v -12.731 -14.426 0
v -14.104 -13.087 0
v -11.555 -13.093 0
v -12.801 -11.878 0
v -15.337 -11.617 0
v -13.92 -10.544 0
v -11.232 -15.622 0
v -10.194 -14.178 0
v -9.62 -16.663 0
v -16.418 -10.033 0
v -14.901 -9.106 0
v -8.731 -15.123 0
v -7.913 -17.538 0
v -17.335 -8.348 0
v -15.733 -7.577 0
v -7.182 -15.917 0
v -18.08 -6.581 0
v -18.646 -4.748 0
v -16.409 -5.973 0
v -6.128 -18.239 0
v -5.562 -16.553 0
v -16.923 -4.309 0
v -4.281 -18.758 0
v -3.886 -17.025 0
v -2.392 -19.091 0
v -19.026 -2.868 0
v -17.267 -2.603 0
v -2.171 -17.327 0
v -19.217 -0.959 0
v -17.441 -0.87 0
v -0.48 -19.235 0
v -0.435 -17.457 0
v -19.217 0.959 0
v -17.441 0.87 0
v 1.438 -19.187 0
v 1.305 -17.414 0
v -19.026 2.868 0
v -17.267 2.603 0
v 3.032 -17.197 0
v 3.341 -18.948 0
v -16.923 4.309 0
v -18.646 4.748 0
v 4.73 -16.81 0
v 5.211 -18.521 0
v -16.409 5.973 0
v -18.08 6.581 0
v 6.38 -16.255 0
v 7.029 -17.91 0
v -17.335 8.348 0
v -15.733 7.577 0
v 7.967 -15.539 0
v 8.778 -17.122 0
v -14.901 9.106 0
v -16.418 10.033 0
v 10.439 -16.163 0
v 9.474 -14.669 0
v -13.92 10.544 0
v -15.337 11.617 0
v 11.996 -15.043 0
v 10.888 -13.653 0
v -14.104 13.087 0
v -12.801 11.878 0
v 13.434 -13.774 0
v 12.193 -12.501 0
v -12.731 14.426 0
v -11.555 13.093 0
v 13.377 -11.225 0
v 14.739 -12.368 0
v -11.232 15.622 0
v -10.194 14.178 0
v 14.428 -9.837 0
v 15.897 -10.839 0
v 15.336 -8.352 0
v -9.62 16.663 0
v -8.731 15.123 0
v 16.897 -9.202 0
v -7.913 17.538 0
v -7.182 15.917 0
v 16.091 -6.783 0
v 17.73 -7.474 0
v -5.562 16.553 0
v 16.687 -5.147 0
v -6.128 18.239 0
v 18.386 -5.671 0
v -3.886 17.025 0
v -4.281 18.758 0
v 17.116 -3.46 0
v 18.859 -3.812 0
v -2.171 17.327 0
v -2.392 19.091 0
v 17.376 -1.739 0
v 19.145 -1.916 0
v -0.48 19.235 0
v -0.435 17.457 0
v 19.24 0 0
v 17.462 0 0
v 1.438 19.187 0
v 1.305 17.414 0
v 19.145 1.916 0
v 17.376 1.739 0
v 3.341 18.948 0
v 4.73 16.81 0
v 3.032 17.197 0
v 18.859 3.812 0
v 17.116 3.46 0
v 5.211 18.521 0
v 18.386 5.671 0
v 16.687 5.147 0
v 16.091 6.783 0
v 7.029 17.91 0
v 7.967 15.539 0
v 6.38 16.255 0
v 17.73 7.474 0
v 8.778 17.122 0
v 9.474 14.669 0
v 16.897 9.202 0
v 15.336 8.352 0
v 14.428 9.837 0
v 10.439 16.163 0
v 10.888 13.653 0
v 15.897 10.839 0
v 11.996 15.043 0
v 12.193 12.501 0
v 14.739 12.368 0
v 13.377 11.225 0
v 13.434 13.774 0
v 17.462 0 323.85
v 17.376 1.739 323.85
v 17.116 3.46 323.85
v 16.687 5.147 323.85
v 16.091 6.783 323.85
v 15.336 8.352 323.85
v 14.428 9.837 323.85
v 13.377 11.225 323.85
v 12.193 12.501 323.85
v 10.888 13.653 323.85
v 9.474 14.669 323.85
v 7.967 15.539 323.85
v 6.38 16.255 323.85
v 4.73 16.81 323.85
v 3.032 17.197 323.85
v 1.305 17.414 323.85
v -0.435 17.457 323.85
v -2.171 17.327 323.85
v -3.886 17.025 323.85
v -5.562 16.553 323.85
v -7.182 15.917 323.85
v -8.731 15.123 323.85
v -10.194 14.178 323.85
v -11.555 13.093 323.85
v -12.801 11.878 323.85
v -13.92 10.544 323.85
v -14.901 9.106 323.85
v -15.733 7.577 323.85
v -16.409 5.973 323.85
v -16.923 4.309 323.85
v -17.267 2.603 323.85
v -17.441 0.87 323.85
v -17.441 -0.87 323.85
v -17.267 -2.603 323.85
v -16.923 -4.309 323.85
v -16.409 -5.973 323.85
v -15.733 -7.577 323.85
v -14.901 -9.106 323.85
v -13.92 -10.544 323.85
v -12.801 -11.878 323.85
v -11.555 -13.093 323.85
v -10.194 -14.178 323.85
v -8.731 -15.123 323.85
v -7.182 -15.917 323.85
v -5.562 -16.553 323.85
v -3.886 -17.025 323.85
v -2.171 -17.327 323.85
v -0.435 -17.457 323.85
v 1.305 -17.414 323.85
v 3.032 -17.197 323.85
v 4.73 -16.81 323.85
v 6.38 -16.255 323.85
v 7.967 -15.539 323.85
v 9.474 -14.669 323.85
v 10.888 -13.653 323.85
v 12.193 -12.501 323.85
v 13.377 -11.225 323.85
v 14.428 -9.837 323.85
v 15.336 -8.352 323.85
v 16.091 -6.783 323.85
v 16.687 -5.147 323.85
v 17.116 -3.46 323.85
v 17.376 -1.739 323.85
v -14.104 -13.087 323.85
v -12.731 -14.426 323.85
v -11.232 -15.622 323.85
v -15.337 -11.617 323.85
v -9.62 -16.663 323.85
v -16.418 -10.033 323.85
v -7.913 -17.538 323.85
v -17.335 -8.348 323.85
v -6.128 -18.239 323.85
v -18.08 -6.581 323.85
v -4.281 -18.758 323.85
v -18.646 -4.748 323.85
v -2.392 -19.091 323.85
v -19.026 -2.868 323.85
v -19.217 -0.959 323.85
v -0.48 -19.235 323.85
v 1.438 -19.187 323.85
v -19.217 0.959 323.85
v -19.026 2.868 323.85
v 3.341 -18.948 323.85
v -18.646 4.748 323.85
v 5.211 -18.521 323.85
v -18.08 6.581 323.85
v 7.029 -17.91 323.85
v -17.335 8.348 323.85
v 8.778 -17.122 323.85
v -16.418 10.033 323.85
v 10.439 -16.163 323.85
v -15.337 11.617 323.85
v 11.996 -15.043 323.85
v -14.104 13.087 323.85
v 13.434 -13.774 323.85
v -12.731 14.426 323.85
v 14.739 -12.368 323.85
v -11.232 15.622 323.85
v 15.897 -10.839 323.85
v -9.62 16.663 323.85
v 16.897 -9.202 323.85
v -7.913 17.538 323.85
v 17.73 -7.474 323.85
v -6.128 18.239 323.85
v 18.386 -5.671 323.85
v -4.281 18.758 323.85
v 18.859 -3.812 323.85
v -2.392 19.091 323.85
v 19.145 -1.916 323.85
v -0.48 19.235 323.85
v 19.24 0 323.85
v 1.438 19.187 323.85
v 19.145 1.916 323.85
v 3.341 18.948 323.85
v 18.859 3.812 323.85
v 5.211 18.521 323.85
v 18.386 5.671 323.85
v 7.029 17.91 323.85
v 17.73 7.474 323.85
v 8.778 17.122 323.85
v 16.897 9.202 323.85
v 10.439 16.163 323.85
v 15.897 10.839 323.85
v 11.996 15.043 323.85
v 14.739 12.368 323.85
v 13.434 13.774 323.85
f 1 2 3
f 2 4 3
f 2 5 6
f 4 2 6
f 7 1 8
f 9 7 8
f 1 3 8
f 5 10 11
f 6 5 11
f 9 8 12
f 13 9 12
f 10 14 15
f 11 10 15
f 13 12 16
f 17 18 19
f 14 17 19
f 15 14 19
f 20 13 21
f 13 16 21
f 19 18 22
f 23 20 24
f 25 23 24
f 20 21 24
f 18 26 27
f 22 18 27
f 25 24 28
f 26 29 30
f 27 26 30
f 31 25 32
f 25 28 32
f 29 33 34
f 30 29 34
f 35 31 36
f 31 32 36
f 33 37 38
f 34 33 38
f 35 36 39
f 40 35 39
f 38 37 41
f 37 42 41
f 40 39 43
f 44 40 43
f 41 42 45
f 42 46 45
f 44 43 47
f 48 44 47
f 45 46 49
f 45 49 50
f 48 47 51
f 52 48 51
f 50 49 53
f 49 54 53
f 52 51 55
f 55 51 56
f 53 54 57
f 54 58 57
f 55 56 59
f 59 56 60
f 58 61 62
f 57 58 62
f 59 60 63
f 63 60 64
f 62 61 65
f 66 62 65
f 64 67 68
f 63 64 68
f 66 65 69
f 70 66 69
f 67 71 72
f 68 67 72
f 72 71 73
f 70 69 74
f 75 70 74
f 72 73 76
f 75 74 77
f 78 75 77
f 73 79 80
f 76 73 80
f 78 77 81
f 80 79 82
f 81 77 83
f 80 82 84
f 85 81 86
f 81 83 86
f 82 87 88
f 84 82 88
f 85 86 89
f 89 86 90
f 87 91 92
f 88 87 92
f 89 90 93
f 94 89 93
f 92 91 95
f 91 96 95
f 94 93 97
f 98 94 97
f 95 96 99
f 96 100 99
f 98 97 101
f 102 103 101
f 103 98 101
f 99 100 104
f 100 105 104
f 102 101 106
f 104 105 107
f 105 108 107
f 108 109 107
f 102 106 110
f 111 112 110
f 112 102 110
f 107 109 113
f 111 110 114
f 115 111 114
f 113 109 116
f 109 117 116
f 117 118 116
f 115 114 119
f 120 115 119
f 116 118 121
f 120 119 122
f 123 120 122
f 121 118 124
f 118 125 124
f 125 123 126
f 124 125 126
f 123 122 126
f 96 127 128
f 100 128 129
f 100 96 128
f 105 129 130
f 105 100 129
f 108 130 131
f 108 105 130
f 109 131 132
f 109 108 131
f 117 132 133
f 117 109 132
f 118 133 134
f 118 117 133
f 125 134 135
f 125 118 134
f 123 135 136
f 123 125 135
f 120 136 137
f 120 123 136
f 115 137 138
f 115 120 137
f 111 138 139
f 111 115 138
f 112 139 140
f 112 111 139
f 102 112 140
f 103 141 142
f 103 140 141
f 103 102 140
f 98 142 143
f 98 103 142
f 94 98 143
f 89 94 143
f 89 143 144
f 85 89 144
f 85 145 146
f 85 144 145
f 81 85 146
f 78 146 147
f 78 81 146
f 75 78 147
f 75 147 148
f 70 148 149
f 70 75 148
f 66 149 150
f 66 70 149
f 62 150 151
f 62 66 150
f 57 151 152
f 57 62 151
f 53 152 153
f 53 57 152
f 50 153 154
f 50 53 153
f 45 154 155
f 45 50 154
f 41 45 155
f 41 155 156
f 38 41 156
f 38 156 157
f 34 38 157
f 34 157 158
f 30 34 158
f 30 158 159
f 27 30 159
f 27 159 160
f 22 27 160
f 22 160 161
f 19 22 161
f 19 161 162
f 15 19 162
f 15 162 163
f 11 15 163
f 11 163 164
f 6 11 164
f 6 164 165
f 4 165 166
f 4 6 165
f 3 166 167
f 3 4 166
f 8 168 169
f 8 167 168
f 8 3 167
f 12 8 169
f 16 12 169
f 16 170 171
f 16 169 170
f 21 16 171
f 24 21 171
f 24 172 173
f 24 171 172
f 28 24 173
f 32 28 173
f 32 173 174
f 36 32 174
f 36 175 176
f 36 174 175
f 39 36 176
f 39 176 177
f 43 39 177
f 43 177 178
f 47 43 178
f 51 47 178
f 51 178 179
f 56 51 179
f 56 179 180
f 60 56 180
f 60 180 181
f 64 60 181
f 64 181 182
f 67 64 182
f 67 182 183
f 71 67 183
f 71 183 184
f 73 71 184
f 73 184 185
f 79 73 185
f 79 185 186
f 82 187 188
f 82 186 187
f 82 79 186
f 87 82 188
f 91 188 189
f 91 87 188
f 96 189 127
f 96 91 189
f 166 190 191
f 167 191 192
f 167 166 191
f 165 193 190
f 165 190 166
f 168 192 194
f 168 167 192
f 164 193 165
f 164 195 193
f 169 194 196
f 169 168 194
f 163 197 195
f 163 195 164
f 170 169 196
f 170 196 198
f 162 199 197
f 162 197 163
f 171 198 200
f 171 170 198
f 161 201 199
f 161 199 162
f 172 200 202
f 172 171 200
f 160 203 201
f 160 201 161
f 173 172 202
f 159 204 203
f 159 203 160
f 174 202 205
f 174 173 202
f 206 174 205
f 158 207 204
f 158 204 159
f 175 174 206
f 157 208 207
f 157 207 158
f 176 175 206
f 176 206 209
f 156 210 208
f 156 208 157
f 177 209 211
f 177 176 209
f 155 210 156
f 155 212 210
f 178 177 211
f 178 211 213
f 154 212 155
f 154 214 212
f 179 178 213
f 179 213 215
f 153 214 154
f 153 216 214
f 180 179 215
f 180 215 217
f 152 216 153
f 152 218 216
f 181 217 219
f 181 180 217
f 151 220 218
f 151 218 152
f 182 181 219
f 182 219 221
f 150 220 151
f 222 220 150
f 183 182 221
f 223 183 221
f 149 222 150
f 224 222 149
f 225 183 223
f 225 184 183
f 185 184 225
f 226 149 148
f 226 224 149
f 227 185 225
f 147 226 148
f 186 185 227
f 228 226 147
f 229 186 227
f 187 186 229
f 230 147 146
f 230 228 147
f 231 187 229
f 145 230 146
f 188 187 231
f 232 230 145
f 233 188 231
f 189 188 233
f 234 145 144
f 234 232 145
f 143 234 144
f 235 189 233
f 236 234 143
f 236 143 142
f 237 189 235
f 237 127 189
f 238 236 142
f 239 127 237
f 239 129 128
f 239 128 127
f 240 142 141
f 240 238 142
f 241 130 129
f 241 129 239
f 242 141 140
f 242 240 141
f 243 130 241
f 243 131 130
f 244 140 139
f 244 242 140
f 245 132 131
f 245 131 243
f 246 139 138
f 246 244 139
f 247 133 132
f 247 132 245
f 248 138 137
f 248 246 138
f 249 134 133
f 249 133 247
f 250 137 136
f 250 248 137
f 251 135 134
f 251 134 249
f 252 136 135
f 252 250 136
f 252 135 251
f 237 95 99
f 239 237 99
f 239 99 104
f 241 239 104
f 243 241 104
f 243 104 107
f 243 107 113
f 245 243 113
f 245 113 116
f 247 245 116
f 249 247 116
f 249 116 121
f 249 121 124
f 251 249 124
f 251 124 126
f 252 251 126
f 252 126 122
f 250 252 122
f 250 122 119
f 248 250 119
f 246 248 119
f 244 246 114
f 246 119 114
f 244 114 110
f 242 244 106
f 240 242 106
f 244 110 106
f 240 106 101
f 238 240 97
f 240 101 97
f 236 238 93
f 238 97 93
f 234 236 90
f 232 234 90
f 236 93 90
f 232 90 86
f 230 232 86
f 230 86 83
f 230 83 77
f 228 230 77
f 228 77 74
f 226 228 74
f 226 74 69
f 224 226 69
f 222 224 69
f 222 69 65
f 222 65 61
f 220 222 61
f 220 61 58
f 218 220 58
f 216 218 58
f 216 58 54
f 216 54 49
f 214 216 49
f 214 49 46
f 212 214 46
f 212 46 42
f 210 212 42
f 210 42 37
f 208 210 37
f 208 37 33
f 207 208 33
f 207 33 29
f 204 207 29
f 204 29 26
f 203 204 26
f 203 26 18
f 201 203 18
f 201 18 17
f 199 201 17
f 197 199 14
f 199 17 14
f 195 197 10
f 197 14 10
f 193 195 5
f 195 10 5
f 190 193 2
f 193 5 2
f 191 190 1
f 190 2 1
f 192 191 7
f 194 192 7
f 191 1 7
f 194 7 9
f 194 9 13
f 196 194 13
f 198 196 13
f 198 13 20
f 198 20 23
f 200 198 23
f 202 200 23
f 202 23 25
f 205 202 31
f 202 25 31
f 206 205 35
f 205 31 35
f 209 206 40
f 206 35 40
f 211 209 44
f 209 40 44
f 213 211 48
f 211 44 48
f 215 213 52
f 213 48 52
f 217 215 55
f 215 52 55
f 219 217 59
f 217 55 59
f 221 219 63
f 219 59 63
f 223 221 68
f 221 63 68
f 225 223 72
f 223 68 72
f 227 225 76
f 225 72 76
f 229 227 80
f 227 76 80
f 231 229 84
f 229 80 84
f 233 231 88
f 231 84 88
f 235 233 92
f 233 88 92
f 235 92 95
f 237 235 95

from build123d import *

# Parameters (mm, degrees)
ESQUISSE1_R             = 19.2405
ESQUISSE1_R_2           = 17.4625
BOSS_EXTRU_1_DEPTH      = 914.4
ENL_V_START             = -63.5
ESQUISSE3_R             = 19.2405
ENL_V_MAT_EXTRU_1_DEPTH = 63.5
ENL_V_START_2           = -527.05
ESQUISSE4_R             = 19.2405
ENL_V_MAT_EXTRU_2_DEPTH = 527.05


with BuildPart() as part:
    # Esquisse1 → Boss.-Extru.1 (new body)
    with BuildSketch(Plane.XY):
        Circle(ESQUISSE1_R)
        Circle(ESQUISSE1_R_2, mode=Mode.SUBTRACT)
    extrude(amount=BOSS_EXTRU_1_DEPTH)

    # Esquisse3 → Enlèv. mat.-Extru.1 (cut)
    with BuildSketch(Plane.XY.offset(914.4).offset(ENL_V_START)):
        Circle(ESQUISSE3_R)
    extrude(amount=ENL_V_MAT_EXTRU_1_DEPTH, mode=Mode.SUBTRACT)

    # Esquisse4 → Enlèv. mat.-Extru.2 (cut)
    with BuildSketch(Plane.XY.offset(850.9).offset(ENL_V_START_2)):
        Circle(ESQUISSE4_R)
    extrude(amount=ENL_V_MAT_EXTRU_2_DEPTH, mode=Mode.SUBTRACT)


solid = part.part
